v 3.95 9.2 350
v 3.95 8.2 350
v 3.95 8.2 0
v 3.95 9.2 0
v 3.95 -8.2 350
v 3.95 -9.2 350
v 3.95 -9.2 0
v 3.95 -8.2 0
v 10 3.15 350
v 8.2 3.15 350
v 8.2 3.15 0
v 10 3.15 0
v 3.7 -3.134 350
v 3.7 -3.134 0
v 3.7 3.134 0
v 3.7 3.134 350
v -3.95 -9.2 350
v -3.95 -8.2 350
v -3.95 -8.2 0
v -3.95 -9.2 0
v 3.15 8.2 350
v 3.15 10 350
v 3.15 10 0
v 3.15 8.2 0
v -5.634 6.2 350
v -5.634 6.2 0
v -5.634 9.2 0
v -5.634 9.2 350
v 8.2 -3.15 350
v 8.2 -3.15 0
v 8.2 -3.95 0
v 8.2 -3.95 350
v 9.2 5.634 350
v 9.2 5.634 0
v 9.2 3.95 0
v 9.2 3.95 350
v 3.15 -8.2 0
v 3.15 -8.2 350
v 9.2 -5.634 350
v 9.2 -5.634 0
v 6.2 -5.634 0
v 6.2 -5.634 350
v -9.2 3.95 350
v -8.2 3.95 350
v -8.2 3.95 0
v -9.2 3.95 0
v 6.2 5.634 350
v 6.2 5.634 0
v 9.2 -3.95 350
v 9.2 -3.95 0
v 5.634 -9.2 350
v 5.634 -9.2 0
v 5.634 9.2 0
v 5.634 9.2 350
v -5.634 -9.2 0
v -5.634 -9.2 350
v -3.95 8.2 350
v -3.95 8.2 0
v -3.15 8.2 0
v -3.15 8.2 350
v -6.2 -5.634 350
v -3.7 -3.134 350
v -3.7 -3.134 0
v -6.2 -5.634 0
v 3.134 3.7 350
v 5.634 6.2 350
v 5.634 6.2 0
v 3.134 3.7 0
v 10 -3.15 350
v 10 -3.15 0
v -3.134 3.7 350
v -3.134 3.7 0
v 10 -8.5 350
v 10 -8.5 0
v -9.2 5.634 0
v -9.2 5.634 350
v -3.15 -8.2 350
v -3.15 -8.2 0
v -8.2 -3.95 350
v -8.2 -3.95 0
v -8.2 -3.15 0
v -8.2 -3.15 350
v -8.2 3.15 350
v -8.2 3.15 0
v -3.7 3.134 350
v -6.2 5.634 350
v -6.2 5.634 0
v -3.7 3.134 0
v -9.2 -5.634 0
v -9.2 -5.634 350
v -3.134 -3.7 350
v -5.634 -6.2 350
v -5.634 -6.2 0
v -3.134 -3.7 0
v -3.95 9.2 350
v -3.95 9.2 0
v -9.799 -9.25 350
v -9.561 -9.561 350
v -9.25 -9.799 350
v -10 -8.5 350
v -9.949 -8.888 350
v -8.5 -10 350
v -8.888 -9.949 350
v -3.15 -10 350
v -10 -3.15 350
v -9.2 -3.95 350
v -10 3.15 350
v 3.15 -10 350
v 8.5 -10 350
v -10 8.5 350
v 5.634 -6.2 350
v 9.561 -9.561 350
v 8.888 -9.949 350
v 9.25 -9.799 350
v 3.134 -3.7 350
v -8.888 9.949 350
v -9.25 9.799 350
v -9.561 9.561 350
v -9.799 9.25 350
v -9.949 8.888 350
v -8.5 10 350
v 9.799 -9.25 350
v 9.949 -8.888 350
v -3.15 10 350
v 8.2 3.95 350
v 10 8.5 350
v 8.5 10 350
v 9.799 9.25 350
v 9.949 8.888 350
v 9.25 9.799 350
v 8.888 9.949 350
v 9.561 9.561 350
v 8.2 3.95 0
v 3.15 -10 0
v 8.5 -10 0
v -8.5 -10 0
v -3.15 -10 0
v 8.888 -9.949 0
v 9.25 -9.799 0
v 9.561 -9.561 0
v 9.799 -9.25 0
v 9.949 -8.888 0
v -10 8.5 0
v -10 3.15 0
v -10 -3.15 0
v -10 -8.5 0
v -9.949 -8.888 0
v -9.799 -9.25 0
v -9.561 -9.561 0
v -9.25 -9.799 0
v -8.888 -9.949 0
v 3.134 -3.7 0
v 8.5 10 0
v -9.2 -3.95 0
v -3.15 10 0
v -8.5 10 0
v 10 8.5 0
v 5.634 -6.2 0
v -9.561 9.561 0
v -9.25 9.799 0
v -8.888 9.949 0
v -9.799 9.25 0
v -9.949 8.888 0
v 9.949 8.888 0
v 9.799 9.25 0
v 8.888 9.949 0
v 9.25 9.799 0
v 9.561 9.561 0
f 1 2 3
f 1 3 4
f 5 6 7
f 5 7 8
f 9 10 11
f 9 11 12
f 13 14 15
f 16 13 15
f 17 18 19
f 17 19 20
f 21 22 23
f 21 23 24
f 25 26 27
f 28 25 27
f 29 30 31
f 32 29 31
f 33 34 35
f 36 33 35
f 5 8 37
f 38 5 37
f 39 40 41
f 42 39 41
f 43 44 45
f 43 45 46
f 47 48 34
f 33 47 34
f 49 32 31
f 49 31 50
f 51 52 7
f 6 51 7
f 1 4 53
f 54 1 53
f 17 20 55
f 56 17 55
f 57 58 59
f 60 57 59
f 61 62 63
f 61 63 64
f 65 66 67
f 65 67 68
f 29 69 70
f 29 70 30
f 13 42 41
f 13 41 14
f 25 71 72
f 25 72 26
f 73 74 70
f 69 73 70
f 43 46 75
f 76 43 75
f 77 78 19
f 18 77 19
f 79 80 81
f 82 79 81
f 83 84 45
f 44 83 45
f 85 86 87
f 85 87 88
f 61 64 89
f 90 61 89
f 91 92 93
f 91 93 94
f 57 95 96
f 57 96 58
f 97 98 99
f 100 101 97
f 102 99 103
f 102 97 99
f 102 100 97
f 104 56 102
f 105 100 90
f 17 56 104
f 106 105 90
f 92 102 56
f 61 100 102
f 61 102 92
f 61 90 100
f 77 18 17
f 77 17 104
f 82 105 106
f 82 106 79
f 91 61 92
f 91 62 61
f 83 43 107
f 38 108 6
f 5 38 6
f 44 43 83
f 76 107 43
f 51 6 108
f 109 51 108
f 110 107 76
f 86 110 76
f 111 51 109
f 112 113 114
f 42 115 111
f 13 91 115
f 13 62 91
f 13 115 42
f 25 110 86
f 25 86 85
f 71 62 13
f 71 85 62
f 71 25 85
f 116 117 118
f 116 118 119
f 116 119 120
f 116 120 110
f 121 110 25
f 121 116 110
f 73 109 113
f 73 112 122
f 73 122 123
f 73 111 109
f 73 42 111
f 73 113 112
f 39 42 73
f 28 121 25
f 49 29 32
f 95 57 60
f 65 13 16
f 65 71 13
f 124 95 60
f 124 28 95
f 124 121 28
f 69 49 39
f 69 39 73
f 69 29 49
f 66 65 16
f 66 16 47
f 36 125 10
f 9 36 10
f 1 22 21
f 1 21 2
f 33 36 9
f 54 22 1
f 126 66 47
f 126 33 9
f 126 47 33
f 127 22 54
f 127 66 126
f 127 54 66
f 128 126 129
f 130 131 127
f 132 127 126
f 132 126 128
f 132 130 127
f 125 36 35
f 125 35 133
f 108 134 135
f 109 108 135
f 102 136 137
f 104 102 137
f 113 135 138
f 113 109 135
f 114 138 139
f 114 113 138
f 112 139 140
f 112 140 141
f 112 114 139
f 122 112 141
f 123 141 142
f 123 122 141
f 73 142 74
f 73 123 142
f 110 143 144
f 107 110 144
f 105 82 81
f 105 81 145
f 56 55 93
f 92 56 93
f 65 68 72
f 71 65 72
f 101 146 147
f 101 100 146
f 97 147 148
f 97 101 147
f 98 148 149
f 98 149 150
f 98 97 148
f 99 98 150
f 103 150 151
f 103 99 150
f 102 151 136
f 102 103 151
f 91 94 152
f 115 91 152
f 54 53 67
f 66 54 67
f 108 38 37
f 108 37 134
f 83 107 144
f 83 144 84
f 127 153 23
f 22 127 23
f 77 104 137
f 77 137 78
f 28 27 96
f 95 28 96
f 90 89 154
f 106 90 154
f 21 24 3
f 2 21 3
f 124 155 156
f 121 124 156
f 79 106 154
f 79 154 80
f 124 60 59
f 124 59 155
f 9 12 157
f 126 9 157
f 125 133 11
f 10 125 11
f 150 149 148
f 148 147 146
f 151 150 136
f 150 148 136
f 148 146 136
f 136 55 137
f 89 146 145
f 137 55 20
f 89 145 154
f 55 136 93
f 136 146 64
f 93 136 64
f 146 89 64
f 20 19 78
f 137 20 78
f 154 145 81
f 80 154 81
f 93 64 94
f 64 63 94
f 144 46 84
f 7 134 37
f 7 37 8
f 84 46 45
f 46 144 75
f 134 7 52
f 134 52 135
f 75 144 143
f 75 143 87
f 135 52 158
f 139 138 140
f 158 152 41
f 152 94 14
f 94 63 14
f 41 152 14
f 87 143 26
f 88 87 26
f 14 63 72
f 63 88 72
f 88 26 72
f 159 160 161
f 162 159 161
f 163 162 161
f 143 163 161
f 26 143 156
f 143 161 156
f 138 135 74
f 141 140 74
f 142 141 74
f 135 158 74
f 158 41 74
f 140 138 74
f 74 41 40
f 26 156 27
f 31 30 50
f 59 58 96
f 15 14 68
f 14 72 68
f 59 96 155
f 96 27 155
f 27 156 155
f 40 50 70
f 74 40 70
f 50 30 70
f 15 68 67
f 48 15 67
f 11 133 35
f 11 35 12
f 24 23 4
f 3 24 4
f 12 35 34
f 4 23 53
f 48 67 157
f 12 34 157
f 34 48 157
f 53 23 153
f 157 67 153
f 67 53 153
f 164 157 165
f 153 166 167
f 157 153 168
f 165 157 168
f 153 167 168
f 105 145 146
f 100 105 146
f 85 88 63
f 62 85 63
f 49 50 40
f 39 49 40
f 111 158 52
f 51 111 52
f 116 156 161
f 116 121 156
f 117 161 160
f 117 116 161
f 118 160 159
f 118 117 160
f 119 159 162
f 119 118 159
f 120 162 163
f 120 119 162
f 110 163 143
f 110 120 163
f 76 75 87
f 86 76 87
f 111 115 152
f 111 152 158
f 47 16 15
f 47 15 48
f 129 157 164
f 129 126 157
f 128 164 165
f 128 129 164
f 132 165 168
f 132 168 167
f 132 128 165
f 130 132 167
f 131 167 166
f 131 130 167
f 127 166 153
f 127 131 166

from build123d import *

# Parameters (mm, degrees)
EXTRUDE_2_DEPTH = 350
FILLET_1_R      = 1.5


with BuildPart() as part:
    # 草图1 → 凸台-拉伸2 (new body)
    with BuildSketch(Plane.XY):
        Polygon((-10, -3.15), (-10, -10), (-3.15, -10), (-3.15, -8.2), (-3.95, -8.2), (-3.95, -9.2), (-5.634314575, -9.2), (-5.634314575, -6.2), (-3.134314575, -3.7), (3.134314575, -3.7), (5.634314575, -6.2), (5.634314575, -9.2), (3.95, -9.2), (3.95, -8.2), (3.15, -8.2), (3.15, -10), (10, -10), (10, -3.15), (8.2, -3.15), (8.2, -3.95), (9.2, -3.95), (9.2, -5.634314575), (6.2, -5.634314575), (3.7, -3.134314575), (3.7, 3.134314575), (6.2, 5.634314575), (9.2, 5.634314575), (9.2, 3.95), (8.2, 3.95), (8.2, 3.15), (10, 3.15), (10, 10), (3.15, 10), (3.15, 8.2), (3.95, 8.2), (3.95, 9.2), (5.634314575, 9.2), (5.634314575, 6.2), (3.134314575, 3.7), (-3.134314575, 3.7), (-5.634314575, 6.2), (-5.634314575, 9.2), (-3.95, 9.2), (-3.95, 8.2), (-3.15, 8.2), (-3.15, 10), (-10, 10), (-10, 3.15), (-8.2, 3.15), (-8.2, 3.95), (-9.2, 3.95), (-9.2, 5.634314575), (-6.2, 5.634314575), (-3.7, 3.134314575), (-3.7, -3.134314575), (-6.2, -5.634314575), (-9.2, -5.634314575), (-9.2, -3.95), (-8.2, -3.95), (-8.2, -3.15), align=None)
    extrude(amount=EXTRUDE_2_DEPTH)

    # 圆角1
    fillet_1_edges = [part.edges().sort_by_distance(p)[0] for p in [
        (-10, -10, 175),
        (-10, 10, 175),
        (10, 10, 175),
        (10, -10, 175),
    ]]
    fillet(fillet_1_edges, radius=FILLET_1_R)


solid = part.part
